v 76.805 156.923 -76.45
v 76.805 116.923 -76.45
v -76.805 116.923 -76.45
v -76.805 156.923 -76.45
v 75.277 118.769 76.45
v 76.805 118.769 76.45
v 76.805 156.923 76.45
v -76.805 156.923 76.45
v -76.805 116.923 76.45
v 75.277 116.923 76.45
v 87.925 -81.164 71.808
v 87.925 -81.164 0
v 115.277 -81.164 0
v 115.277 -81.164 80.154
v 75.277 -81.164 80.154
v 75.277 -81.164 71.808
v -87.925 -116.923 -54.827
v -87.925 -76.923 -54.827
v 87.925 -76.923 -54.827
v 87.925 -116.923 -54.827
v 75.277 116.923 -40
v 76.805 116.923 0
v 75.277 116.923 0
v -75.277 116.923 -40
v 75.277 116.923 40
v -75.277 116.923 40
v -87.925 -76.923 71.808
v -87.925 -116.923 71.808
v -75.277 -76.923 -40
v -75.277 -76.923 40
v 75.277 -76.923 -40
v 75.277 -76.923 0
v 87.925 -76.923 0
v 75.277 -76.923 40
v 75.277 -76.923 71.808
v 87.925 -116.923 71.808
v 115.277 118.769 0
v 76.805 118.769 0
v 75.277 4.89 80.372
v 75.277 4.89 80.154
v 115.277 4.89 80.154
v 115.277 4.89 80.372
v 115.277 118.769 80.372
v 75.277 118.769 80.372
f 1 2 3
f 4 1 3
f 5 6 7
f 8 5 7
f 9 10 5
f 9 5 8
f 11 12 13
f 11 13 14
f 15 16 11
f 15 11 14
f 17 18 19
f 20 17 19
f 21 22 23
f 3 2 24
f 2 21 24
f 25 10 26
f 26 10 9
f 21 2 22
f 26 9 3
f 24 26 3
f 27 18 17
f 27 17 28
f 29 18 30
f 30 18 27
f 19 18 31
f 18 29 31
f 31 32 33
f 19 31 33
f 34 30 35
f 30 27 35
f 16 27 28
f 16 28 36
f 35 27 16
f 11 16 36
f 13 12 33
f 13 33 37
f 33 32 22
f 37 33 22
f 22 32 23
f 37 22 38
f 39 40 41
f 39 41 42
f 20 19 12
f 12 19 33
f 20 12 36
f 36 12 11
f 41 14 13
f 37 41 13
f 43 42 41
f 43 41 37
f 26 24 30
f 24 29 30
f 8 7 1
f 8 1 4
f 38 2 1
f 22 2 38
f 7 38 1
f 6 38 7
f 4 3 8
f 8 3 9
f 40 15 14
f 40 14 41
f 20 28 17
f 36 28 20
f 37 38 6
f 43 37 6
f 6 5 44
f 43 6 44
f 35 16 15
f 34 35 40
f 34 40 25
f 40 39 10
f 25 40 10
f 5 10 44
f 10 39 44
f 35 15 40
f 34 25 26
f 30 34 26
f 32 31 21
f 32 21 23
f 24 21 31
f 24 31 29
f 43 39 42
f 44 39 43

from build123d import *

# Parameters (mm, degrees)
F0_W       = 150.5549252033
F0_H       = 153.845757246
F1_DEPTH   = 40
F2_W       = 150.5549252033
F2_H       = 153.845757246
F3_DEPTH   = 40
F4_W       = 150.5549252033
F4_H       = 80
F4_R       = 2.7459354745
F3_FACE_W  = 150.5549252033
F3_FACE_H  = 80
F3_FACE1_W = 150.5549252033
F3_FACE1_H = 80
F5_DEPTH   = 40
F6_W       = 175.8493036032
F6_H       = 126.634541899
F7_DEPTH   = 40
F9_W       = 86.0539241694
F9_H       = 80.1538974047
F10_DEPTH  = 40
F11_W      = 113.8785094954
F11_H      = 80.3718343377
F12_DEPTH  = 40
F13_W      = 153.6099761724
F13_H      = 152.900993824
F14_DEPTH  = 40


with BuildPart() as f1:
    # F0 (on Top) → F1 (new body)
    with BuildSketch(Plane.XY):
        Rectangle(F0_W, F0_H)
    extrude(amount=F1_DEPTH)

    # F2 (on face) → F3 (join)
    with BuildSketch(Plane(origin=(0, 0, 0), x_dir=(1, 0, 0), z_dir=(0, 0, -1))):
        Rectangle(F2_W, F2_H)
    extrude(amount=F3_DEPTH)

    # F4 (on face) + F3_face (on face) + F3_face1 (on face) → F5 (join)
    with BuildSketch(Plane(origin=(0, 76.922878623, 0), x_dir=(-1, 0, 0), z_dir=(0, 1, 0))):
        Rectangle(F4_W, F4_H)
        Circle(F4_R, mode=Mode.SUBTRACT)
        Circle(F4_R)
    with BuildSketch(Plane(origin=(0, 76.922878623, 0), x_dir=(-1, 0, 0), z_dir=(0, 1, 0))):
        Rectangle(F3_FACE_W, F3_FACE_H)
    with BuildSketch(Plane.XZ.offset(76.922878623)):
        Rectangle(F3_FACE1_W, F3_FACE1_H)
    extrude(amount=F5_DEPTH, dir=(0, 1, 0))

    # F6 (on face) → F7 (join)
    with BuildSketch(Plane.XZ.offset(76.922878623)):
        with Locations((0, 8.4902700037)):
            Rectangle(F6_W, F6_H)
    extrude(amount=F7_DEPTH)

    # F9 (on face) → F10 (join)
    with BuildSketch(Plane.YZ.offset(75.2774626017)):
        with Locations((-38.1367646623, 40.0769487023)):
            Rectangle(F9_W, F9_H)
    extrude(amount=F10_DEPTH)

    # F11 (on face) → F12 (join)
    with BuildSketch(Plane.YZ.offset(75.2774626017)):
        with Locations((61.8294521701, 40.1859171689)):
            Rectangle(F11_W, F11_H)
    extrude(amount=F12_DEPTH)

    # F13 (on face) → F14 (join)
    with BuildSketch(Plane(origin=(0, 116.922878623, 0), x_dir=(-1, 0, 0), z_dir=(0, 1, 0))):
        Rectangle(F13_W, F13_H)
    extrude(amount=F14_DEPTH)


solid = f1.part
